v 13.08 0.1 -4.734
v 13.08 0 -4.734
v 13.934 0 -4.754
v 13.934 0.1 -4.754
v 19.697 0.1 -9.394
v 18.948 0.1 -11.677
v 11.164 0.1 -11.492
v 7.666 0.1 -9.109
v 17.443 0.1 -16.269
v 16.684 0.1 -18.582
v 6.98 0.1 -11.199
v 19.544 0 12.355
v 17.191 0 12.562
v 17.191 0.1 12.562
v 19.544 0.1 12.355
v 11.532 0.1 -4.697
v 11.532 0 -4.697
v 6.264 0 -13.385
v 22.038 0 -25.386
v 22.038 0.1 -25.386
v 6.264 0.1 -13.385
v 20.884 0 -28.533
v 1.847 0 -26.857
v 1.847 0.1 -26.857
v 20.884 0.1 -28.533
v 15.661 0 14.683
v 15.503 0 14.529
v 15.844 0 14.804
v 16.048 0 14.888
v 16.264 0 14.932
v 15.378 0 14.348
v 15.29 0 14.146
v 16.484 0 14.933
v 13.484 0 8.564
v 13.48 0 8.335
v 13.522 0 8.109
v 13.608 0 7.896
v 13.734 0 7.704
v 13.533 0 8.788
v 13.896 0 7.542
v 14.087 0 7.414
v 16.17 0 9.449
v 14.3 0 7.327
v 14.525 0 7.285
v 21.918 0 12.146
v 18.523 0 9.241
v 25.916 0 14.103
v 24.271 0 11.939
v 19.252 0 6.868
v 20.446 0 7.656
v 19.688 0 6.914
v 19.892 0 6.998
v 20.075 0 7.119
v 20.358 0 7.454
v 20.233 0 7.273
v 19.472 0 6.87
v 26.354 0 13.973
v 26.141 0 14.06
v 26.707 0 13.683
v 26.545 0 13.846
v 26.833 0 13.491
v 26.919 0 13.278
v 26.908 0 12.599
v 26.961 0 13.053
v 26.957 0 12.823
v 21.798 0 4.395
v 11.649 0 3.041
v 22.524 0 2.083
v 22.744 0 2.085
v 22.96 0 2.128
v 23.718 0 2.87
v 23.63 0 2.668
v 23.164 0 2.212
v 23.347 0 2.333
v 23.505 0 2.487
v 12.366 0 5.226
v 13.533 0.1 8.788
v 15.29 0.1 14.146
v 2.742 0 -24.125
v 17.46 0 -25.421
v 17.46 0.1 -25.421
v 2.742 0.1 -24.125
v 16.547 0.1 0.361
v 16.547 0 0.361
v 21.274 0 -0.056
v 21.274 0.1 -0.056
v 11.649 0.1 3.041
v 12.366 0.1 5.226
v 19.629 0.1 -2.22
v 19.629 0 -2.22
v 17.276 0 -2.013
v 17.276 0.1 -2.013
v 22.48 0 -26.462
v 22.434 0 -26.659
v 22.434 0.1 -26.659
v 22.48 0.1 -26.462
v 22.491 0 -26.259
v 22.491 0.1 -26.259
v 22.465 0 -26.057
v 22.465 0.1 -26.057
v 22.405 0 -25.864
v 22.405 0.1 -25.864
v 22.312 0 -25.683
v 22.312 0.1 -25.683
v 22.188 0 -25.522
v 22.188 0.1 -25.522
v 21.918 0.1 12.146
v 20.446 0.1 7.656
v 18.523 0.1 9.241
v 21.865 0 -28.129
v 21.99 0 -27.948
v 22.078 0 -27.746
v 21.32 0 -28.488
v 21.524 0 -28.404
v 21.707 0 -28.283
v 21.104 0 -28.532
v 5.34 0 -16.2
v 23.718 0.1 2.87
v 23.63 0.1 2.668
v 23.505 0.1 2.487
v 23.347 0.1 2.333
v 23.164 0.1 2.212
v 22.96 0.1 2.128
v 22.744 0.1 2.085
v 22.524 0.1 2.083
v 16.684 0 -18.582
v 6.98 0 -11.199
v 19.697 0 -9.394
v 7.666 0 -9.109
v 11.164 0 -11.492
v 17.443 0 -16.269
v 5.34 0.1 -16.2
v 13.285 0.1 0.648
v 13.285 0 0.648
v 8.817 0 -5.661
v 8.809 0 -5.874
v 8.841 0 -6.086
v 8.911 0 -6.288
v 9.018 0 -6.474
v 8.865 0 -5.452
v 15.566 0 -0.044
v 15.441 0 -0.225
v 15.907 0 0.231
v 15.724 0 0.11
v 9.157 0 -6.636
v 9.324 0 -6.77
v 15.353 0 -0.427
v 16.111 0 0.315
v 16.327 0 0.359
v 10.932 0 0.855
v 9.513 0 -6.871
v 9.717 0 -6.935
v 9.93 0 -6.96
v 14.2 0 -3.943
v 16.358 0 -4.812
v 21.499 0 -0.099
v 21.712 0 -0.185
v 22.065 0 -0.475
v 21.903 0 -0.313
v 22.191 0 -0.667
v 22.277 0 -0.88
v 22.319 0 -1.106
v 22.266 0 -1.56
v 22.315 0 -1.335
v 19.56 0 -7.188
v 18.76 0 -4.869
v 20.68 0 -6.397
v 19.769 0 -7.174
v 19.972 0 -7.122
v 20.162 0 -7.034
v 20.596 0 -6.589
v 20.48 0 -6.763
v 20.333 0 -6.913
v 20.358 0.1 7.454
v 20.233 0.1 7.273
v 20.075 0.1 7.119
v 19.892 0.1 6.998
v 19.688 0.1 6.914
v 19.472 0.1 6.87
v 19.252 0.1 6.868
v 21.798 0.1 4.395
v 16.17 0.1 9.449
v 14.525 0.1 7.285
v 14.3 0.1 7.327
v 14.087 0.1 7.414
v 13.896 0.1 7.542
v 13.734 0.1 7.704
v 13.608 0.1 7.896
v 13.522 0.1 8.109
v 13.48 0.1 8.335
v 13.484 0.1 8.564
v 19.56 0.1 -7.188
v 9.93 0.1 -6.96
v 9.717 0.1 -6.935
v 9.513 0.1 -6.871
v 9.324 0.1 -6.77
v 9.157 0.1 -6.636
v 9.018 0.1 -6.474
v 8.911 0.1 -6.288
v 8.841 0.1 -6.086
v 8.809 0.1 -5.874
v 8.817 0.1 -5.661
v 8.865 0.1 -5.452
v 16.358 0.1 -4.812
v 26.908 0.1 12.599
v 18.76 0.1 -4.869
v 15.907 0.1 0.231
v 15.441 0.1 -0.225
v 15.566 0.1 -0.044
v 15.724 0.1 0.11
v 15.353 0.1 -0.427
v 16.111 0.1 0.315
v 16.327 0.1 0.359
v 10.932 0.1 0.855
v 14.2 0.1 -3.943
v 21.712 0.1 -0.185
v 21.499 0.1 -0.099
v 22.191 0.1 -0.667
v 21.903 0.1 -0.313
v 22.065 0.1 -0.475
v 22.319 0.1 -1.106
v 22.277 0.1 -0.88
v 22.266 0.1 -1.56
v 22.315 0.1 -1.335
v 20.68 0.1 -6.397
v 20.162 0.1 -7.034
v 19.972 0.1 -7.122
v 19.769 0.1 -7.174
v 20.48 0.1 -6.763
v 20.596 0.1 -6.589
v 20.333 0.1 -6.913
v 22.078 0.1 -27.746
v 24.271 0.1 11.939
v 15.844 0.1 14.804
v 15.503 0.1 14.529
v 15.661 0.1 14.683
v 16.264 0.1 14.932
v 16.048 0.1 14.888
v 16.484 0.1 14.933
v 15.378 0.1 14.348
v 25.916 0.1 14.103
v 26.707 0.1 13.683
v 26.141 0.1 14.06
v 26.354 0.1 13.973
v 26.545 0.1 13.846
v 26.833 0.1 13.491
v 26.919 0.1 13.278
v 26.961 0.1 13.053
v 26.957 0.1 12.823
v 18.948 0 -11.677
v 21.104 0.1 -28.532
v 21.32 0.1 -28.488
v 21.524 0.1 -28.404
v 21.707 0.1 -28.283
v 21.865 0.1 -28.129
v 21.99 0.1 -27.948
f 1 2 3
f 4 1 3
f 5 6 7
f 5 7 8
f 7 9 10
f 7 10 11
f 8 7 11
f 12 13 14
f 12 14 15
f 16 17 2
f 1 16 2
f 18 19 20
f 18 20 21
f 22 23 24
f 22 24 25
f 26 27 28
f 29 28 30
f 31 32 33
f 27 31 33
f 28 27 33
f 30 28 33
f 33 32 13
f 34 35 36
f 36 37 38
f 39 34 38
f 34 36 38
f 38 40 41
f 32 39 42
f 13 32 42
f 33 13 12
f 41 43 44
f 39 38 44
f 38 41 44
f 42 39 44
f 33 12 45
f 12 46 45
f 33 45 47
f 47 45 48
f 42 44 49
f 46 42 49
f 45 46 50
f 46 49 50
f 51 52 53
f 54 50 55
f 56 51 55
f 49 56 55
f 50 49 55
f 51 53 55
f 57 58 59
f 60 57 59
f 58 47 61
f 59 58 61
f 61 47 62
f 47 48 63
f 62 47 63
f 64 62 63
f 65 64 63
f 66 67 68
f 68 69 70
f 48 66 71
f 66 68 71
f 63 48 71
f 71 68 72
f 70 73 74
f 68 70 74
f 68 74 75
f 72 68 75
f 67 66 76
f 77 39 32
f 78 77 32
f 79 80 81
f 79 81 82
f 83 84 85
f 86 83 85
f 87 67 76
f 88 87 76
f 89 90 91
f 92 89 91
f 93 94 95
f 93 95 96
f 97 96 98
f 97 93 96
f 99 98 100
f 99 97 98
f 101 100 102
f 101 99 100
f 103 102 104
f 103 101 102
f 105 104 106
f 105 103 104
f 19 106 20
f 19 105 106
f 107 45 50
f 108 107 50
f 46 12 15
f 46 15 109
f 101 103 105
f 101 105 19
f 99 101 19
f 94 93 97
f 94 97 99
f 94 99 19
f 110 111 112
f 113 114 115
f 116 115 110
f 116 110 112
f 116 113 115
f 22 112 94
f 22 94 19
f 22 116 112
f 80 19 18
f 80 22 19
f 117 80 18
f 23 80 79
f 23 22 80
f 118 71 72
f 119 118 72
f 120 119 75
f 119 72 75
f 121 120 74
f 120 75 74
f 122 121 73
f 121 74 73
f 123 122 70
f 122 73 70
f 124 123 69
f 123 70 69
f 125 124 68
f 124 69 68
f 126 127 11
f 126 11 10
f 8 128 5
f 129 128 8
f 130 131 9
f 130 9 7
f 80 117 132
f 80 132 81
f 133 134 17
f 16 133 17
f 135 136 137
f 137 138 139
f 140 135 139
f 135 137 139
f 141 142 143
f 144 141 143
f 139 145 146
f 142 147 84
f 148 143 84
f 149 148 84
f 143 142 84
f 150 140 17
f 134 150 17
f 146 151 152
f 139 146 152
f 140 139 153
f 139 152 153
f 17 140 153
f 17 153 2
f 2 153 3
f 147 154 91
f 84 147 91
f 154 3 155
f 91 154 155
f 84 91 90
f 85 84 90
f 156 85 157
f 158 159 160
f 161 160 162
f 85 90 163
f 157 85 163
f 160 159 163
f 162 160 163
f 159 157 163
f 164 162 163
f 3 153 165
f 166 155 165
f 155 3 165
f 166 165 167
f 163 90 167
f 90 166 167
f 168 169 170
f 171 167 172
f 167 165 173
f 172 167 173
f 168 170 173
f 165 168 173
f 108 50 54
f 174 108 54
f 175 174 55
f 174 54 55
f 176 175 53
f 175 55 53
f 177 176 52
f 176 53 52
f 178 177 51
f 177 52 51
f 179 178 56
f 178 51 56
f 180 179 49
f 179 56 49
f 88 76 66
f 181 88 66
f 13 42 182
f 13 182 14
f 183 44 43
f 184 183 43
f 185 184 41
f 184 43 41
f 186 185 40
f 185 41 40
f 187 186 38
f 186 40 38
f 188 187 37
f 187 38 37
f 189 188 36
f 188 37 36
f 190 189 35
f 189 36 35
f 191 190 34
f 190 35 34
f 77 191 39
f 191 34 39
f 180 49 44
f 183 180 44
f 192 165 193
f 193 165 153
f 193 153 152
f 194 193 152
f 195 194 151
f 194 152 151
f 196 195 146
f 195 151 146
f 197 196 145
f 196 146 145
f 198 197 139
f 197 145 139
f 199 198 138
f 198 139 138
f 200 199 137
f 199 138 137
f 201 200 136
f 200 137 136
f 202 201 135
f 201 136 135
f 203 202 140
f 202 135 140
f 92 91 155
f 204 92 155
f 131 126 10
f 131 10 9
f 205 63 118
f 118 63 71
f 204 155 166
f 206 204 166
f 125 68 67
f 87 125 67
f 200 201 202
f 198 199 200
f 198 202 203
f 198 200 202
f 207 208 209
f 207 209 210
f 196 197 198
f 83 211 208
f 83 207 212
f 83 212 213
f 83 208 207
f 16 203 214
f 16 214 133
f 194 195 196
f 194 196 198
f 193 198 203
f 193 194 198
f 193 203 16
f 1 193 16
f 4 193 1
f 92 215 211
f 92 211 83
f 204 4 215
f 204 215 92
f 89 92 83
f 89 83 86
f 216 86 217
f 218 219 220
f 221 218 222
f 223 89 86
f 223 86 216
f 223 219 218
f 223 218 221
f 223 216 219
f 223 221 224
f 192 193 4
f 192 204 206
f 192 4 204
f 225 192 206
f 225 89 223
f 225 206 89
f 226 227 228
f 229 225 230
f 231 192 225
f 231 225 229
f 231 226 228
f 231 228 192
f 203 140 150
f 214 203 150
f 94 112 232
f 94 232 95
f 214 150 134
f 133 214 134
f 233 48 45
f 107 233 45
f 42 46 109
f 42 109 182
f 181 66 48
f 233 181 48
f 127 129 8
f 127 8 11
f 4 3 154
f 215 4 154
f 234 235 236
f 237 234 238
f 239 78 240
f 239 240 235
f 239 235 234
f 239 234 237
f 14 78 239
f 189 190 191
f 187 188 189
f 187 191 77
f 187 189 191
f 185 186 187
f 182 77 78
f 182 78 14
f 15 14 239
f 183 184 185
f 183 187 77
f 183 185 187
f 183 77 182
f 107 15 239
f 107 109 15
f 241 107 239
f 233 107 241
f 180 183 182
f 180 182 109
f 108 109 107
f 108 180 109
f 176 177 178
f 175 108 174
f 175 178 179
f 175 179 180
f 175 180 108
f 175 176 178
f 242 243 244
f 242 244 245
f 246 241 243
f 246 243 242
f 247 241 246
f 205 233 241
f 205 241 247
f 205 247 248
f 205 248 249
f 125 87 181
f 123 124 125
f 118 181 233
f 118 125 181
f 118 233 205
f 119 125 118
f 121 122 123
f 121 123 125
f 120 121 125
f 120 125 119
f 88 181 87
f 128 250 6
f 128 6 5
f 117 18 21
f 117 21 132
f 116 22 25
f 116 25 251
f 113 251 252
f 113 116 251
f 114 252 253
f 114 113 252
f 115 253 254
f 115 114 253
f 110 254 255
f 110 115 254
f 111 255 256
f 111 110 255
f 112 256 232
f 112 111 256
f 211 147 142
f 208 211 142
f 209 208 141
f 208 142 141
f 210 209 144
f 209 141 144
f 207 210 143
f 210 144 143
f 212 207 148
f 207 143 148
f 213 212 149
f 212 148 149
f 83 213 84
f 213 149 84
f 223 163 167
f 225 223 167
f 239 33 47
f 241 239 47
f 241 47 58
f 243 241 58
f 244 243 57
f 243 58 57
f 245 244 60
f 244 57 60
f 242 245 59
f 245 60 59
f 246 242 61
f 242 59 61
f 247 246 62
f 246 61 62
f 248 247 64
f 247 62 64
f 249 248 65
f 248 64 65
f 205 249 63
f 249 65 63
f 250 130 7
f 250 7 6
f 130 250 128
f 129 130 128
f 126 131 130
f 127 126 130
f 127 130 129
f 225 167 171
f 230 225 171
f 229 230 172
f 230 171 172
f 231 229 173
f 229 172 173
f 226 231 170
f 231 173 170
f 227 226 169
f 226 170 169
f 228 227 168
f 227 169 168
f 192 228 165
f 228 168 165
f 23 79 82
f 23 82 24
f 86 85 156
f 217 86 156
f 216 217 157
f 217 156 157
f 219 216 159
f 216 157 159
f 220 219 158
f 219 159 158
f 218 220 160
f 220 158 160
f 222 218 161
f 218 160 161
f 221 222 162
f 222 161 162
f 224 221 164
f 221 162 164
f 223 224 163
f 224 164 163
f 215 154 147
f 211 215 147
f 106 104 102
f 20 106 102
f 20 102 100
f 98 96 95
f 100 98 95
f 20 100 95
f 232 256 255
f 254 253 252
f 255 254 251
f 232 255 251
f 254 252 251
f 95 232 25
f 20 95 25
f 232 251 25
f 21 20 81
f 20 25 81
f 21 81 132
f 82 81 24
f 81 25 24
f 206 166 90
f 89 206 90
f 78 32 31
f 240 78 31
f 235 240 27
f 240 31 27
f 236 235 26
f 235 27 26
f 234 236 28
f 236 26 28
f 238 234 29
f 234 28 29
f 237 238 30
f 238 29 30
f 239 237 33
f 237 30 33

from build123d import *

# Parameters (mm, degrees)
BOSS_EXTRUDE1_DEPTH   = 0.1
BOSS_EXTRUDE1_2_DEPTH = 0.1
BOSS_EXTRUDE1_3_DEPTH = 0.1
BOSS_EXTRUDE1_4_DEPTH = 0.1


with BuildPart() as part:
    # Sketch1 → Boss-Extrude1 (new body)
    with BuildSketch(Plane(origin=(0, 0, 0), x_dir=(1, 0, 0), z_dir=(0, 1, 0))):
        Polygon((6.98019195, 11.199123603), (16.684431195, 18.582207132), (17.442796564, 16.269192757), (11.164089792, 11.492289037), (18.948427041, 11.677019802), (19.696913973, 9.394134661), (7.665603422, 9.108618613), align=None)
    extrude(amount=BOSS_EXTRUDE1_DEPTH)


with BuildPart() as body_2:
    # Sketch1 → Boss-Extrude1 2 (new body)
    with BuildSketch(Plane(origin=(0, 0, 0), x_dir=(1, 0, 0), z_dir=(0, 1, 0))):
        with BuildLine():
            Line((19.559550761, 7.188342037), (9.930020512, 6.959822841))
            ThreePointArc((9.930020512, 6.959822841), (9.018095469, 6.473763981), (8.864539605, 5.451863254))
            Line((8.864539605, 5.451863254), (10.932369195, -0.855016994))
            Line((10.932369195, -0.855016994), (13.284911092, -0.64784301))
            Line((13.284911092, -0.64784301), (11.532437194, 4.697202379))
            Line((11.532437194, 4.697202379), (13.080287744, 4.733934551))
            Line((13.080287744, 4.733934551), (13.934217495, 4.75419923))
            Line((13.934217495, 4.75419923), (14.200334782, 3.942541503))
            Line((14.200334782, 3.942541503), (15.353073683, 0.426687855))
            ThreePointArc((15.353073683, 0.426687855), (15.812662586, -0.175023319), (16.546720694, -0.360595378))
            Line((16.546720694, -0.360595378), (21.273754131, 0.05568556))
            ThreePointArc((21.273754131, 0.05568556), (22.132865535, 0.568076993), (22.265635064, 1.559535333))
            Line((22.265635064, 1.559535333), (20.679597799, 6.39694899))
            ThreePointArc((20.679597799, 6.39694899), (20.250451284, 6.977873828), (19.559550761, 7.188342037))
        make_face()
        Polygon((17.276171965, 2.012544247), (16.358406841, 4.811727872), (18.760187142, 4.868724724), (19.628713861, 2.219718231), align=None, mode=Mode.SUBTRACT)
    extrude(amount=BOSS_EXTRUDE1_2_DEPTH)


with BuildPart() as body_3:
    # Sketch1 → Boss-Extrude1 3 (new body)
    with BuildSketch(Plane(origin=(0, 0, 0), x_dir=(1, 0, 0), z_dir=(0, 1, 0))):
        with BuildLine():
            Line((6.263625411, 13.384651547), (5.340398005, 16.200495135))
            Line((5.340398005, 16.200495135), (17.459500781, 25.420831303))
            Line((17.459500781, 25.420831303), (2.742299504, 24.124695563))
            Line((2.742299504, 24.124695563), (1.846577535, 26.85664757))
            Line((1.846577535, 26.85664757), (20.884224807, 28.533282589))
            ThreePointArc((20.884224807, 28.533282589), (21.618286586, 28.347712831), (22.077878135, 27.745999912))
            Line((22.077878135, 27.745999912), (22.434184025, 26.659266946))
            ThreePointArc((22.434184025, 26.659266946), (22.439445548, 25.959164993), (22.037735709, 25.385754466))
            Line((22.037735709, 25.385754466), (6.263625411, 13.384651547))
        make_face()
    extrude(amount=BOSS_EXTRUDE1_3_DEPTH)


with BuildPart() as body_4:
    # Sketch1 → Boss-Extrude1 4 (new body)
    with BuildSketch(Plane(origin=(0, 0, 0), x_dir=(1, 0, 0), z_dir=(0, 1, 0))):
        with BuildLine():
            Line((11.648935734, -3.040544938), (12.365502273, -5.226072882))
            Line((12.365502273, -5.226072882), (21.797619503, -4.395443977))
            Line((21.797619503, -4.395443977), (24.270818832, -11.93870193))
            Line((24.270818832, -11.93870193), (21.918276935, -12.145875914))
            Line((21.918276935, -12.145875914), (20.446023451, -7.655502787))
            ThreePointArc((20.446023451, -7.655502787), (19.986434548, -7.053791613), (19.25237644, -6.868219553))
            Line((19.25237644, -6.868219553), (14.525343003, -7.284500491))
            ThreePointArc((14.525343003, -7.284500491), (13.666231599, -7.796891925), (13.53346207, -8.788350264))
            Line((13.53346207, -8.788350264), (15.29009486, -14.146080273))
            ThreePointArc((15.29009486, -14.146080273), (15.749683763, -14.747791447), (16.483741871, -14.933363506))
            Line((16.483741871, -14.933363506), (25.915859101, -14.1027346))
            ThreePointArc((25.915859101, -14.1027346), (26.774970506, -13.590343167), (26.907740034, -12.598884828))
            Line((26.907740034, -12.598884828), (23.717974166, -2.870098931))
            ThreePointArc((23.717974166, -2.870098931), (23.258385264, -2.268387757), (22.524327155, -2.082815697))
            Line((22.524327155, -2.082815697), (11.648935734, -3.040544938))
        make_face()
        Polygon((17.191243499, -12.562156852), (19.543785396, -12.354982868), (18.522925169, -9.241359178), (16.170383273, -9.448533162), align=None, mode=Mode.SUBTRACT)
    extrude(amount=BOSS_EXTRUDE1_4_DEPTH)


solid = Compound([part.part, body_2.part, body_3.part, body_4.part])
